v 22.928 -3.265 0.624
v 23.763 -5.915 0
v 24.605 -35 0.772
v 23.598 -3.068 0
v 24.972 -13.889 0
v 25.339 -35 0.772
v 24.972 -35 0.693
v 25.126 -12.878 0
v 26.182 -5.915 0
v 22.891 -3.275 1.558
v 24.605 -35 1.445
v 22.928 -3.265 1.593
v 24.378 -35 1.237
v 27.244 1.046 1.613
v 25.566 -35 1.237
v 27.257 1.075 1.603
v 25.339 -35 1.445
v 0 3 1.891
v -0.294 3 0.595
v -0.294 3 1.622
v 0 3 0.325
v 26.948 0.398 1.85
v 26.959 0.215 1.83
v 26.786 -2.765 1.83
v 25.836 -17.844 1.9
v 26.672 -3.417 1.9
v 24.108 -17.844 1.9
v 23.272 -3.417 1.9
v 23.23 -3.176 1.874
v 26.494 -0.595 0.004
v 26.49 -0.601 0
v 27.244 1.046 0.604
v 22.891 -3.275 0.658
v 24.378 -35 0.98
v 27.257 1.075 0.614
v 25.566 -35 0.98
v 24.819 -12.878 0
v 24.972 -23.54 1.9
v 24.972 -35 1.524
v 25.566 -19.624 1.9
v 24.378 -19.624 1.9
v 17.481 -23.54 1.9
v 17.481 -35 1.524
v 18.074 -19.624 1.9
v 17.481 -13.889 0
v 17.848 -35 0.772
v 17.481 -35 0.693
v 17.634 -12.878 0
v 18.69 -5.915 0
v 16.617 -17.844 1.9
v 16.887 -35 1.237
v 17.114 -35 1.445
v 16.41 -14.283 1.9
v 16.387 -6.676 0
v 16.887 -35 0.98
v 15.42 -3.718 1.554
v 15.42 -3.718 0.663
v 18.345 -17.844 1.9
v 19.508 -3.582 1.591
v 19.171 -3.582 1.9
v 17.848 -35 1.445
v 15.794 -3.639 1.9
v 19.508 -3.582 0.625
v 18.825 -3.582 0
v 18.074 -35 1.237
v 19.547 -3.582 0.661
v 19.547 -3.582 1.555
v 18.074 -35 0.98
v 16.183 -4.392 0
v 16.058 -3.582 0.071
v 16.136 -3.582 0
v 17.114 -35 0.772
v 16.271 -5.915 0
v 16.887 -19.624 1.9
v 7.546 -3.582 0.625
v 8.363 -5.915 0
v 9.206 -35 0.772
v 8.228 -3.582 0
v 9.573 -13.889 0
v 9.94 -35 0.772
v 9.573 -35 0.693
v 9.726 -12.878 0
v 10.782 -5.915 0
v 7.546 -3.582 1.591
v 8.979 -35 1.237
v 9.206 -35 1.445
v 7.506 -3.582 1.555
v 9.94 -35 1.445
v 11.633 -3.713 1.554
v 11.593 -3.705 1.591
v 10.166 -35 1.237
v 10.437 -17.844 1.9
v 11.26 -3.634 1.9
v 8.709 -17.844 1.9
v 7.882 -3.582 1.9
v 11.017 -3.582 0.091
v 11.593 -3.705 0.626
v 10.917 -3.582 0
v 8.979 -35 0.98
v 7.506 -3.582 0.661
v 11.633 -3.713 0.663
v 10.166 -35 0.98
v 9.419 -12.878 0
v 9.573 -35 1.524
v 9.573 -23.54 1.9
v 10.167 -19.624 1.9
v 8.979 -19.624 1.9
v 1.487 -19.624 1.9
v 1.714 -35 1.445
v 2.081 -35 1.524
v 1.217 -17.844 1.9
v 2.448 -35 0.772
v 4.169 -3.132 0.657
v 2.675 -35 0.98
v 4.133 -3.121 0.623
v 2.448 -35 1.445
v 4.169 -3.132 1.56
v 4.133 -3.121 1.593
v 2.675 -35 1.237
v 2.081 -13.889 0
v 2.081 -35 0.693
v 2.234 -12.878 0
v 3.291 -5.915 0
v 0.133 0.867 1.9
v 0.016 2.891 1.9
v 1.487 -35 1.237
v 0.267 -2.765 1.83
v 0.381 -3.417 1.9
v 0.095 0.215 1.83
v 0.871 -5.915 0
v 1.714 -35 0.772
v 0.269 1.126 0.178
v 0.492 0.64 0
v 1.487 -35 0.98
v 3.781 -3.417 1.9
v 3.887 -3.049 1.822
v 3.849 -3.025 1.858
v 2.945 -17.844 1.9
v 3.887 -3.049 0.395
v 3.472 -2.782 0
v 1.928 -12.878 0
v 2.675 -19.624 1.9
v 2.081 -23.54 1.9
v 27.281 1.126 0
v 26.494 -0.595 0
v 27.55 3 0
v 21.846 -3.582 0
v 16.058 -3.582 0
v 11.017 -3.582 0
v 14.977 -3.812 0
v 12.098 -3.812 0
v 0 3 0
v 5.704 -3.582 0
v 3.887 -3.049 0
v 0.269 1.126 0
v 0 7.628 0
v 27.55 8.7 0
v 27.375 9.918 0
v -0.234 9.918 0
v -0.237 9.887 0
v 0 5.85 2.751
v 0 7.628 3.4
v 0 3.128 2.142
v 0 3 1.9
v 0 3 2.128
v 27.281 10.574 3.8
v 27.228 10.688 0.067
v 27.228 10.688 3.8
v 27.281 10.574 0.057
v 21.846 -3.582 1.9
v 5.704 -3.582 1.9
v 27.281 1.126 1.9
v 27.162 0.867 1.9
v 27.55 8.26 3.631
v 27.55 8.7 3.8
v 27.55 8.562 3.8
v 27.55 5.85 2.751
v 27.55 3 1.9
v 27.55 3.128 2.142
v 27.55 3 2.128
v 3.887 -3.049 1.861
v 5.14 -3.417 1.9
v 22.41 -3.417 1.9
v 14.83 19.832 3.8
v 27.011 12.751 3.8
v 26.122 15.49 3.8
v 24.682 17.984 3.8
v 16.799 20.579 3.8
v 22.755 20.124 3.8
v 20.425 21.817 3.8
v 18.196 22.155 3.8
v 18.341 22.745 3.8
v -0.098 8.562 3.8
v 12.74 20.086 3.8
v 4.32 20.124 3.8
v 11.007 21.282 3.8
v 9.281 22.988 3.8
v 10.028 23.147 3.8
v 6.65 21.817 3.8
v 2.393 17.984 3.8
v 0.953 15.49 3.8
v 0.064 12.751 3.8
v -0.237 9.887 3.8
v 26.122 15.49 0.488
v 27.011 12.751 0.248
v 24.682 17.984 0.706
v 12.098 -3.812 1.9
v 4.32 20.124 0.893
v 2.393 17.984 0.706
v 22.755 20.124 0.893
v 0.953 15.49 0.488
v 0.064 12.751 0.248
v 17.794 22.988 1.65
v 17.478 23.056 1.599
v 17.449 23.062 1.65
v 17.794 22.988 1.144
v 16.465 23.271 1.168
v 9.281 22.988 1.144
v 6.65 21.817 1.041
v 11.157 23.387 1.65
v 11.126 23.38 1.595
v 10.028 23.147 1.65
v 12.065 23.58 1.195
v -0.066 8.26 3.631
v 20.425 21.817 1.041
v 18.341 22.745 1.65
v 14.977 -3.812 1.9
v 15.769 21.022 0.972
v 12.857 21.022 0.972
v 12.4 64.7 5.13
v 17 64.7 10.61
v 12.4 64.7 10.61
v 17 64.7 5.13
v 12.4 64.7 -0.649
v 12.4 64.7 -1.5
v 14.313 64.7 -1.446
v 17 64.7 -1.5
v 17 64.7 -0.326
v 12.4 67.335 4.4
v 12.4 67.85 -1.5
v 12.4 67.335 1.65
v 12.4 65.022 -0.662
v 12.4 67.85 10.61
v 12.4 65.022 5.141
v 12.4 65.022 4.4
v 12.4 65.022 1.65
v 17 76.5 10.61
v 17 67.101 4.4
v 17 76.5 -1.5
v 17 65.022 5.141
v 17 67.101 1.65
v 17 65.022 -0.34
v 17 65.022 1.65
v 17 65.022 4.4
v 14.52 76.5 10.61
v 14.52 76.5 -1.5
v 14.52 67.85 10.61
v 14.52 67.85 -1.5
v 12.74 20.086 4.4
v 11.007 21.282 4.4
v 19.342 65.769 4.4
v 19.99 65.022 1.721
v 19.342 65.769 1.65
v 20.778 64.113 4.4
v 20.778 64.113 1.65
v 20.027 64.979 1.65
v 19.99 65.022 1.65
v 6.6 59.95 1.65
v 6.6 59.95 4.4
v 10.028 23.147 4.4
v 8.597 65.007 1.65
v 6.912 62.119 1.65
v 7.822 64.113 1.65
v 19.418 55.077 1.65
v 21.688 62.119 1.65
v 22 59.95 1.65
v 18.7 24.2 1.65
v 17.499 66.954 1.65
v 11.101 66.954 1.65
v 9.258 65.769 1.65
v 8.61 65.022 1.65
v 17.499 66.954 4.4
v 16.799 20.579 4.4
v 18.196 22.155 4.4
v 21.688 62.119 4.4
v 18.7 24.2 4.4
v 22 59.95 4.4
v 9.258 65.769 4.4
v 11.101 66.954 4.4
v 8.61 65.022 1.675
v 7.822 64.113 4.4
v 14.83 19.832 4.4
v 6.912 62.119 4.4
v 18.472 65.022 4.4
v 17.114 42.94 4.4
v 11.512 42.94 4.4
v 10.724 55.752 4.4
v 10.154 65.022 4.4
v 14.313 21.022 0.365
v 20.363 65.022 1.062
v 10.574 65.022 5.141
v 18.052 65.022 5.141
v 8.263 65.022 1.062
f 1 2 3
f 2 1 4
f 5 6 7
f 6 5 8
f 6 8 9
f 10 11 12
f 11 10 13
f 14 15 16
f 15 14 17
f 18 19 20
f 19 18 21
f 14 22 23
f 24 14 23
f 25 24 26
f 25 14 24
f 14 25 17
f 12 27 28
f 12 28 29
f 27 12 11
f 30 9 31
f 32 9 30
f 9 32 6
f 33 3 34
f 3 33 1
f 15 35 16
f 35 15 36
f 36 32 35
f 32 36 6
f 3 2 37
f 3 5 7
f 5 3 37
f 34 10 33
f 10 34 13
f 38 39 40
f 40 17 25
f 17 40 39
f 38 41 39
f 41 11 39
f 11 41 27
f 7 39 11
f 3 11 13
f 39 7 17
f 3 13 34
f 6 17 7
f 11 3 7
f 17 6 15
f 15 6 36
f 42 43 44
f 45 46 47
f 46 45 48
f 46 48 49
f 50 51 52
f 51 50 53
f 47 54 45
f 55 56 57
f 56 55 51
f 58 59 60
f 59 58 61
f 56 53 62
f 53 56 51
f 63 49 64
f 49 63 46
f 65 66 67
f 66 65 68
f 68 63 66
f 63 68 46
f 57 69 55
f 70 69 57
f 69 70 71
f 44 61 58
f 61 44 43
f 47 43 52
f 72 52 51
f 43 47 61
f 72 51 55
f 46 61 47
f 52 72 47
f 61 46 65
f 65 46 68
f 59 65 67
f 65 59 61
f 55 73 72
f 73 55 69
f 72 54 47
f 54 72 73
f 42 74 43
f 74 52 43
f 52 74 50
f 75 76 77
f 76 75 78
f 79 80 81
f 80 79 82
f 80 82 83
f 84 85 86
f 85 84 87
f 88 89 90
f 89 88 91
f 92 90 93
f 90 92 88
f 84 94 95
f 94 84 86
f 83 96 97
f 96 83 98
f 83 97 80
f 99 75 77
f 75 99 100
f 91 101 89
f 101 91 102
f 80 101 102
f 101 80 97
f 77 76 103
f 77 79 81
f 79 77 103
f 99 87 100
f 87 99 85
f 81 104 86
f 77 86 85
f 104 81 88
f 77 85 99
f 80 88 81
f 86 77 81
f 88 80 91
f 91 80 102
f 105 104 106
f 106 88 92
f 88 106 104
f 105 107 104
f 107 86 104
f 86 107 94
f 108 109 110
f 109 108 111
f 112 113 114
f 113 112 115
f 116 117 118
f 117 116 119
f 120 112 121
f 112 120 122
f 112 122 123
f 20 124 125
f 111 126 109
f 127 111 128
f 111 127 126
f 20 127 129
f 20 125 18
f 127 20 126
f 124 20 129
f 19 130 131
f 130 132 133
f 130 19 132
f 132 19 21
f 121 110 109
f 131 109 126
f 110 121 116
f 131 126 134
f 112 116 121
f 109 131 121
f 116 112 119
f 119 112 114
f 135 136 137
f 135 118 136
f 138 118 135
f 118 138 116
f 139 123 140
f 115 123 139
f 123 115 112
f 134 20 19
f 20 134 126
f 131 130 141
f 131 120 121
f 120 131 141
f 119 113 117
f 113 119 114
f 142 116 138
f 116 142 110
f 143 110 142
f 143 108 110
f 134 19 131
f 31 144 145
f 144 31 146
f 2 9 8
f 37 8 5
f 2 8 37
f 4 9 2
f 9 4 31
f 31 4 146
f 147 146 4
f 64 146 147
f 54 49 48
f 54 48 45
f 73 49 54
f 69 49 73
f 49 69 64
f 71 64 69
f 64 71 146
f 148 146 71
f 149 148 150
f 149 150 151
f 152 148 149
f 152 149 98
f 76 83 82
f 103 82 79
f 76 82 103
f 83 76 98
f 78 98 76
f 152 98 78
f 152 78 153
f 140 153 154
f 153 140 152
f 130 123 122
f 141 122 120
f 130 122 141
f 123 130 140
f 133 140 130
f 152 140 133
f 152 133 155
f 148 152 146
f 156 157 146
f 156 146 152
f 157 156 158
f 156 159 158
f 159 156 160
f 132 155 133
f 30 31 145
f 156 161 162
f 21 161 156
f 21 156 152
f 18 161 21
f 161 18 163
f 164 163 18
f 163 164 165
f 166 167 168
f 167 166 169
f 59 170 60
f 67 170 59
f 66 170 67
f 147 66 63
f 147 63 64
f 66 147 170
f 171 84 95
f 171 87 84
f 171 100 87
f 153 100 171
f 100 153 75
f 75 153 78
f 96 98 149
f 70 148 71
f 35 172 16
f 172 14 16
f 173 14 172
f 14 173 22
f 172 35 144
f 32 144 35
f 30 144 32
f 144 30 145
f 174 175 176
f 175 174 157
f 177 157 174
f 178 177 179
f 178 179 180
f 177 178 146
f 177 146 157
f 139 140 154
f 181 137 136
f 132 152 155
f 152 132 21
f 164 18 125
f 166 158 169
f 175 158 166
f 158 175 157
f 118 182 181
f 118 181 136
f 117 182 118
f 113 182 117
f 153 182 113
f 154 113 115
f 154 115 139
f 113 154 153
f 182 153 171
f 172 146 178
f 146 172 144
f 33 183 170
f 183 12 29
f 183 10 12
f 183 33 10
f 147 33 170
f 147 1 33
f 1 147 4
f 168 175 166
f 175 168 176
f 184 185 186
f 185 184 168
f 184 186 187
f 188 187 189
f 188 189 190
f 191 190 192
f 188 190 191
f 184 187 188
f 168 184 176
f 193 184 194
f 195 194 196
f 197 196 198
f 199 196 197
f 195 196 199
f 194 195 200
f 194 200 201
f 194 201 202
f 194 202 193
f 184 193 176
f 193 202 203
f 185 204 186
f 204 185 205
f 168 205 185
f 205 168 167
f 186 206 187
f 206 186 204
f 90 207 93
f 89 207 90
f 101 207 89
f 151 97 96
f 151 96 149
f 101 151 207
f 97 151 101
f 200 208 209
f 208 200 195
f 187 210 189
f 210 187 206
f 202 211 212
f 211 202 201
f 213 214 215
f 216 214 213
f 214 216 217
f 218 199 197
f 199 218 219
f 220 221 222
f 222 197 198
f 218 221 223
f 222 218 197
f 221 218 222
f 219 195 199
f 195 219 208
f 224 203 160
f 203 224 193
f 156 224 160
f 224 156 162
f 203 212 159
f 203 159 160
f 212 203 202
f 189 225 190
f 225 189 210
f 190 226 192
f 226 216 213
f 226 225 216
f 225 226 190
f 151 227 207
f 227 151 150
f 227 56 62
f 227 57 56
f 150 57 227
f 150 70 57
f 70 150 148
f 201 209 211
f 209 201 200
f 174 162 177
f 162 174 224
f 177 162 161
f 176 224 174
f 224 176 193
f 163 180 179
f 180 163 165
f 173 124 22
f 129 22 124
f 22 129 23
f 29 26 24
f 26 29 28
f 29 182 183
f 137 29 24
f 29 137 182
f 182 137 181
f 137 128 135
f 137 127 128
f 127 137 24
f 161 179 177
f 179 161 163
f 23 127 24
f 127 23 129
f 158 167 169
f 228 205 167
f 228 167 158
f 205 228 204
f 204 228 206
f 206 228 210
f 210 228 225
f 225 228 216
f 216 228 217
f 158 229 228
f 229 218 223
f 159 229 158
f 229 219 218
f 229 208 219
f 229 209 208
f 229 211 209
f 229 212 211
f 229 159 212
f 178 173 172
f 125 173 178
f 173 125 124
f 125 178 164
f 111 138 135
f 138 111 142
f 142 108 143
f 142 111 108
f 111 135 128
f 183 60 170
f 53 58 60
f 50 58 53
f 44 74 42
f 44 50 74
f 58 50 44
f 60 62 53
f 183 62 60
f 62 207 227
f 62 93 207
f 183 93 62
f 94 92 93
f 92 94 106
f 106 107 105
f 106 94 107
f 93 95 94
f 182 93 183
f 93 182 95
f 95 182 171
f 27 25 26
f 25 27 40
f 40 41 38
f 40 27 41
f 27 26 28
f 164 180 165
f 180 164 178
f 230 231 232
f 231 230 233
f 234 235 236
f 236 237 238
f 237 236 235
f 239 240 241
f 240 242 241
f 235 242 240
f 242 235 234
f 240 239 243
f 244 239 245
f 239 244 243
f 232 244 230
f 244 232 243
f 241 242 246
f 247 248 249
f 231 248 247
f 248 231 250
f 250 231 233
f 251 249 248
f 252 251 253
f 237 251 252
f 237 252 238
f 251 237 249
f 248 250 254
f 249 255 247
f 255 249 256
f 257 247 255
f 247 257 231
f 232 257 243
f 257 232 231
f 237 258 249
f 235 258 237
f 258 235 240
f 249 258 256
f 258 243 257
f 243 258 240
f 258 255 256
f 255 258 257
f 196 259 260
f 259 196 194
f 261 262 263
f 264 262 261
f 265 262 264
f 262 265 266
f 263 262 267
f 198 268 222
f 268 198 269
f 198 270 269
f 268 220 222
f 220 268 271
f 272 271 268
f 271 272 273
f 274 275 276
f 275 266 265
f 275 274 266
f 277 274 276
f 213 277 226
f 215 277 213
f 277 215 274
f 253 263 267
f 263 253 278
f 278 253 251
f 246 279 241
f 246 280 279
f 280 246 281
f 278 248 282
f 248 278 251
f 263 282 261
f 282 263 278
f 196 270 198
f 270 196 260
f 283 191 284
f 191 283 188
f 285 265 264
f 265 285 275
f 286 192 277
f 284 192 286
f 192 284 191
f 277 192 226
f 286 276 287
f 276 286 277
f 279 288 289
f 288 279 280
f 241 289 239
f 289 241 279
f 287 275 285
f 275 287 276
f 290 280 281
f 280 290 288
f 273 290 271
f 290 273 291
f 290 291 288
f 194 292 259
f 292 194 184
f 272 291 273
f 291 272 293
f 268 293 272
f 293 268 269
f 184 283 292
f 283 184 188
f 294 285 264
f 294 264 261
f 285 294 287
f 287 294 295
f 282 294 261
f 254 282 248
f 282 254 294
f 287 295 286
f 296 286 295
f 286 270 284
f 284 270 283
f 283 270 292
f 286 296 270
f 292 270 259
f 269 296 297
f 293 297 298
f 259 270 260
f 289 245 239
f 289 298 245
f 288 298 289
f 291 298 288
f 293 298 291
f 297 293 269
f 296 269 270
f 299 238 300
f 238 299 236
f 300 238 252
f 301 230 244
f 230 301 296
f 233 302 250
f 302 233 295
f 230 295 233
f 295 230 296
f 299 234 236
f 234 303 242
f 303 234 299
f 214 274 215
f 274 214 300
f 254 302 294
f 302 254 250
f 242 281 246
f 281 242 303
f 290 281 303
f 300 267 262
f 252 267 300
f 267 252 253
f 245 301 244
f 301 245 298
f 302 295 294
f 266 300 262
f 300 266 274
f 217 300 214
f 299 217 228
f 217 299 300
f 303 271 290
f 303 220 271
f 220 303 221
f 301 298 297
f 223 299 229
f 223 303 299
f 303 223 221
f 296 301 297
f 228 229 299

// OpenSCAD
translate([0,3,0])scale(.95)difference(){tines(); resize(newsize=[35,30,15])translate([-.5,-3,12.5])rotate([90,0,90])cylinder(35,10,10);translate([-3,7.5,-5])rotate([5,0,0])cube([40,30,5]);translate([0,-40,2])cube([40,40,3]);translate([0,-40,-3])cube([40,40,3]);}

module tines(){resize(newsize=[5,40,3.5])translate([30,0,2])rotate([90,90,0])cylinder(25,3,.75);

resize(newsize=[5,40,3.5])translate([21,0,2])rotate([90,90,0])cylinder(25,3,.75);

resize(newsize=[5,40,3.5])translate([11.5,0,2])rotate([90,90,0])cylinder(25,3,.75);

resize(newsize=[5,40,3.5])translate([2.5,0,2])rotate([90,90,0])cylinder(25,3,.75);

translate([7,0,0])minkowski()
{
 cube([15,6,2]);
 cylinder(r=7,h=2);
};

translate([14.25,7.25,0])cylinder(4,14.5,14.5);}

scale(1.1)translate([13,4.5,1.5])linear_extrude(height=2.5)hull(){translate([0,17.5,0])circle(4); translate([0,50,0])circle(7);}

scale(1.1)resize(newsize=[11,40,6])translate([11.25,66.5,3])rotate([0,90,270])cylinder(45,5,2.5,$fn=5);
 translate([17,76.5,-1.5])rotate([90,0,2790])usb();


module usb(){

difference(){

cube ([11.8,12.11,4.6]);

translate([0,0,2.48])
cube([8.65,12.11,2.12]);

}}
